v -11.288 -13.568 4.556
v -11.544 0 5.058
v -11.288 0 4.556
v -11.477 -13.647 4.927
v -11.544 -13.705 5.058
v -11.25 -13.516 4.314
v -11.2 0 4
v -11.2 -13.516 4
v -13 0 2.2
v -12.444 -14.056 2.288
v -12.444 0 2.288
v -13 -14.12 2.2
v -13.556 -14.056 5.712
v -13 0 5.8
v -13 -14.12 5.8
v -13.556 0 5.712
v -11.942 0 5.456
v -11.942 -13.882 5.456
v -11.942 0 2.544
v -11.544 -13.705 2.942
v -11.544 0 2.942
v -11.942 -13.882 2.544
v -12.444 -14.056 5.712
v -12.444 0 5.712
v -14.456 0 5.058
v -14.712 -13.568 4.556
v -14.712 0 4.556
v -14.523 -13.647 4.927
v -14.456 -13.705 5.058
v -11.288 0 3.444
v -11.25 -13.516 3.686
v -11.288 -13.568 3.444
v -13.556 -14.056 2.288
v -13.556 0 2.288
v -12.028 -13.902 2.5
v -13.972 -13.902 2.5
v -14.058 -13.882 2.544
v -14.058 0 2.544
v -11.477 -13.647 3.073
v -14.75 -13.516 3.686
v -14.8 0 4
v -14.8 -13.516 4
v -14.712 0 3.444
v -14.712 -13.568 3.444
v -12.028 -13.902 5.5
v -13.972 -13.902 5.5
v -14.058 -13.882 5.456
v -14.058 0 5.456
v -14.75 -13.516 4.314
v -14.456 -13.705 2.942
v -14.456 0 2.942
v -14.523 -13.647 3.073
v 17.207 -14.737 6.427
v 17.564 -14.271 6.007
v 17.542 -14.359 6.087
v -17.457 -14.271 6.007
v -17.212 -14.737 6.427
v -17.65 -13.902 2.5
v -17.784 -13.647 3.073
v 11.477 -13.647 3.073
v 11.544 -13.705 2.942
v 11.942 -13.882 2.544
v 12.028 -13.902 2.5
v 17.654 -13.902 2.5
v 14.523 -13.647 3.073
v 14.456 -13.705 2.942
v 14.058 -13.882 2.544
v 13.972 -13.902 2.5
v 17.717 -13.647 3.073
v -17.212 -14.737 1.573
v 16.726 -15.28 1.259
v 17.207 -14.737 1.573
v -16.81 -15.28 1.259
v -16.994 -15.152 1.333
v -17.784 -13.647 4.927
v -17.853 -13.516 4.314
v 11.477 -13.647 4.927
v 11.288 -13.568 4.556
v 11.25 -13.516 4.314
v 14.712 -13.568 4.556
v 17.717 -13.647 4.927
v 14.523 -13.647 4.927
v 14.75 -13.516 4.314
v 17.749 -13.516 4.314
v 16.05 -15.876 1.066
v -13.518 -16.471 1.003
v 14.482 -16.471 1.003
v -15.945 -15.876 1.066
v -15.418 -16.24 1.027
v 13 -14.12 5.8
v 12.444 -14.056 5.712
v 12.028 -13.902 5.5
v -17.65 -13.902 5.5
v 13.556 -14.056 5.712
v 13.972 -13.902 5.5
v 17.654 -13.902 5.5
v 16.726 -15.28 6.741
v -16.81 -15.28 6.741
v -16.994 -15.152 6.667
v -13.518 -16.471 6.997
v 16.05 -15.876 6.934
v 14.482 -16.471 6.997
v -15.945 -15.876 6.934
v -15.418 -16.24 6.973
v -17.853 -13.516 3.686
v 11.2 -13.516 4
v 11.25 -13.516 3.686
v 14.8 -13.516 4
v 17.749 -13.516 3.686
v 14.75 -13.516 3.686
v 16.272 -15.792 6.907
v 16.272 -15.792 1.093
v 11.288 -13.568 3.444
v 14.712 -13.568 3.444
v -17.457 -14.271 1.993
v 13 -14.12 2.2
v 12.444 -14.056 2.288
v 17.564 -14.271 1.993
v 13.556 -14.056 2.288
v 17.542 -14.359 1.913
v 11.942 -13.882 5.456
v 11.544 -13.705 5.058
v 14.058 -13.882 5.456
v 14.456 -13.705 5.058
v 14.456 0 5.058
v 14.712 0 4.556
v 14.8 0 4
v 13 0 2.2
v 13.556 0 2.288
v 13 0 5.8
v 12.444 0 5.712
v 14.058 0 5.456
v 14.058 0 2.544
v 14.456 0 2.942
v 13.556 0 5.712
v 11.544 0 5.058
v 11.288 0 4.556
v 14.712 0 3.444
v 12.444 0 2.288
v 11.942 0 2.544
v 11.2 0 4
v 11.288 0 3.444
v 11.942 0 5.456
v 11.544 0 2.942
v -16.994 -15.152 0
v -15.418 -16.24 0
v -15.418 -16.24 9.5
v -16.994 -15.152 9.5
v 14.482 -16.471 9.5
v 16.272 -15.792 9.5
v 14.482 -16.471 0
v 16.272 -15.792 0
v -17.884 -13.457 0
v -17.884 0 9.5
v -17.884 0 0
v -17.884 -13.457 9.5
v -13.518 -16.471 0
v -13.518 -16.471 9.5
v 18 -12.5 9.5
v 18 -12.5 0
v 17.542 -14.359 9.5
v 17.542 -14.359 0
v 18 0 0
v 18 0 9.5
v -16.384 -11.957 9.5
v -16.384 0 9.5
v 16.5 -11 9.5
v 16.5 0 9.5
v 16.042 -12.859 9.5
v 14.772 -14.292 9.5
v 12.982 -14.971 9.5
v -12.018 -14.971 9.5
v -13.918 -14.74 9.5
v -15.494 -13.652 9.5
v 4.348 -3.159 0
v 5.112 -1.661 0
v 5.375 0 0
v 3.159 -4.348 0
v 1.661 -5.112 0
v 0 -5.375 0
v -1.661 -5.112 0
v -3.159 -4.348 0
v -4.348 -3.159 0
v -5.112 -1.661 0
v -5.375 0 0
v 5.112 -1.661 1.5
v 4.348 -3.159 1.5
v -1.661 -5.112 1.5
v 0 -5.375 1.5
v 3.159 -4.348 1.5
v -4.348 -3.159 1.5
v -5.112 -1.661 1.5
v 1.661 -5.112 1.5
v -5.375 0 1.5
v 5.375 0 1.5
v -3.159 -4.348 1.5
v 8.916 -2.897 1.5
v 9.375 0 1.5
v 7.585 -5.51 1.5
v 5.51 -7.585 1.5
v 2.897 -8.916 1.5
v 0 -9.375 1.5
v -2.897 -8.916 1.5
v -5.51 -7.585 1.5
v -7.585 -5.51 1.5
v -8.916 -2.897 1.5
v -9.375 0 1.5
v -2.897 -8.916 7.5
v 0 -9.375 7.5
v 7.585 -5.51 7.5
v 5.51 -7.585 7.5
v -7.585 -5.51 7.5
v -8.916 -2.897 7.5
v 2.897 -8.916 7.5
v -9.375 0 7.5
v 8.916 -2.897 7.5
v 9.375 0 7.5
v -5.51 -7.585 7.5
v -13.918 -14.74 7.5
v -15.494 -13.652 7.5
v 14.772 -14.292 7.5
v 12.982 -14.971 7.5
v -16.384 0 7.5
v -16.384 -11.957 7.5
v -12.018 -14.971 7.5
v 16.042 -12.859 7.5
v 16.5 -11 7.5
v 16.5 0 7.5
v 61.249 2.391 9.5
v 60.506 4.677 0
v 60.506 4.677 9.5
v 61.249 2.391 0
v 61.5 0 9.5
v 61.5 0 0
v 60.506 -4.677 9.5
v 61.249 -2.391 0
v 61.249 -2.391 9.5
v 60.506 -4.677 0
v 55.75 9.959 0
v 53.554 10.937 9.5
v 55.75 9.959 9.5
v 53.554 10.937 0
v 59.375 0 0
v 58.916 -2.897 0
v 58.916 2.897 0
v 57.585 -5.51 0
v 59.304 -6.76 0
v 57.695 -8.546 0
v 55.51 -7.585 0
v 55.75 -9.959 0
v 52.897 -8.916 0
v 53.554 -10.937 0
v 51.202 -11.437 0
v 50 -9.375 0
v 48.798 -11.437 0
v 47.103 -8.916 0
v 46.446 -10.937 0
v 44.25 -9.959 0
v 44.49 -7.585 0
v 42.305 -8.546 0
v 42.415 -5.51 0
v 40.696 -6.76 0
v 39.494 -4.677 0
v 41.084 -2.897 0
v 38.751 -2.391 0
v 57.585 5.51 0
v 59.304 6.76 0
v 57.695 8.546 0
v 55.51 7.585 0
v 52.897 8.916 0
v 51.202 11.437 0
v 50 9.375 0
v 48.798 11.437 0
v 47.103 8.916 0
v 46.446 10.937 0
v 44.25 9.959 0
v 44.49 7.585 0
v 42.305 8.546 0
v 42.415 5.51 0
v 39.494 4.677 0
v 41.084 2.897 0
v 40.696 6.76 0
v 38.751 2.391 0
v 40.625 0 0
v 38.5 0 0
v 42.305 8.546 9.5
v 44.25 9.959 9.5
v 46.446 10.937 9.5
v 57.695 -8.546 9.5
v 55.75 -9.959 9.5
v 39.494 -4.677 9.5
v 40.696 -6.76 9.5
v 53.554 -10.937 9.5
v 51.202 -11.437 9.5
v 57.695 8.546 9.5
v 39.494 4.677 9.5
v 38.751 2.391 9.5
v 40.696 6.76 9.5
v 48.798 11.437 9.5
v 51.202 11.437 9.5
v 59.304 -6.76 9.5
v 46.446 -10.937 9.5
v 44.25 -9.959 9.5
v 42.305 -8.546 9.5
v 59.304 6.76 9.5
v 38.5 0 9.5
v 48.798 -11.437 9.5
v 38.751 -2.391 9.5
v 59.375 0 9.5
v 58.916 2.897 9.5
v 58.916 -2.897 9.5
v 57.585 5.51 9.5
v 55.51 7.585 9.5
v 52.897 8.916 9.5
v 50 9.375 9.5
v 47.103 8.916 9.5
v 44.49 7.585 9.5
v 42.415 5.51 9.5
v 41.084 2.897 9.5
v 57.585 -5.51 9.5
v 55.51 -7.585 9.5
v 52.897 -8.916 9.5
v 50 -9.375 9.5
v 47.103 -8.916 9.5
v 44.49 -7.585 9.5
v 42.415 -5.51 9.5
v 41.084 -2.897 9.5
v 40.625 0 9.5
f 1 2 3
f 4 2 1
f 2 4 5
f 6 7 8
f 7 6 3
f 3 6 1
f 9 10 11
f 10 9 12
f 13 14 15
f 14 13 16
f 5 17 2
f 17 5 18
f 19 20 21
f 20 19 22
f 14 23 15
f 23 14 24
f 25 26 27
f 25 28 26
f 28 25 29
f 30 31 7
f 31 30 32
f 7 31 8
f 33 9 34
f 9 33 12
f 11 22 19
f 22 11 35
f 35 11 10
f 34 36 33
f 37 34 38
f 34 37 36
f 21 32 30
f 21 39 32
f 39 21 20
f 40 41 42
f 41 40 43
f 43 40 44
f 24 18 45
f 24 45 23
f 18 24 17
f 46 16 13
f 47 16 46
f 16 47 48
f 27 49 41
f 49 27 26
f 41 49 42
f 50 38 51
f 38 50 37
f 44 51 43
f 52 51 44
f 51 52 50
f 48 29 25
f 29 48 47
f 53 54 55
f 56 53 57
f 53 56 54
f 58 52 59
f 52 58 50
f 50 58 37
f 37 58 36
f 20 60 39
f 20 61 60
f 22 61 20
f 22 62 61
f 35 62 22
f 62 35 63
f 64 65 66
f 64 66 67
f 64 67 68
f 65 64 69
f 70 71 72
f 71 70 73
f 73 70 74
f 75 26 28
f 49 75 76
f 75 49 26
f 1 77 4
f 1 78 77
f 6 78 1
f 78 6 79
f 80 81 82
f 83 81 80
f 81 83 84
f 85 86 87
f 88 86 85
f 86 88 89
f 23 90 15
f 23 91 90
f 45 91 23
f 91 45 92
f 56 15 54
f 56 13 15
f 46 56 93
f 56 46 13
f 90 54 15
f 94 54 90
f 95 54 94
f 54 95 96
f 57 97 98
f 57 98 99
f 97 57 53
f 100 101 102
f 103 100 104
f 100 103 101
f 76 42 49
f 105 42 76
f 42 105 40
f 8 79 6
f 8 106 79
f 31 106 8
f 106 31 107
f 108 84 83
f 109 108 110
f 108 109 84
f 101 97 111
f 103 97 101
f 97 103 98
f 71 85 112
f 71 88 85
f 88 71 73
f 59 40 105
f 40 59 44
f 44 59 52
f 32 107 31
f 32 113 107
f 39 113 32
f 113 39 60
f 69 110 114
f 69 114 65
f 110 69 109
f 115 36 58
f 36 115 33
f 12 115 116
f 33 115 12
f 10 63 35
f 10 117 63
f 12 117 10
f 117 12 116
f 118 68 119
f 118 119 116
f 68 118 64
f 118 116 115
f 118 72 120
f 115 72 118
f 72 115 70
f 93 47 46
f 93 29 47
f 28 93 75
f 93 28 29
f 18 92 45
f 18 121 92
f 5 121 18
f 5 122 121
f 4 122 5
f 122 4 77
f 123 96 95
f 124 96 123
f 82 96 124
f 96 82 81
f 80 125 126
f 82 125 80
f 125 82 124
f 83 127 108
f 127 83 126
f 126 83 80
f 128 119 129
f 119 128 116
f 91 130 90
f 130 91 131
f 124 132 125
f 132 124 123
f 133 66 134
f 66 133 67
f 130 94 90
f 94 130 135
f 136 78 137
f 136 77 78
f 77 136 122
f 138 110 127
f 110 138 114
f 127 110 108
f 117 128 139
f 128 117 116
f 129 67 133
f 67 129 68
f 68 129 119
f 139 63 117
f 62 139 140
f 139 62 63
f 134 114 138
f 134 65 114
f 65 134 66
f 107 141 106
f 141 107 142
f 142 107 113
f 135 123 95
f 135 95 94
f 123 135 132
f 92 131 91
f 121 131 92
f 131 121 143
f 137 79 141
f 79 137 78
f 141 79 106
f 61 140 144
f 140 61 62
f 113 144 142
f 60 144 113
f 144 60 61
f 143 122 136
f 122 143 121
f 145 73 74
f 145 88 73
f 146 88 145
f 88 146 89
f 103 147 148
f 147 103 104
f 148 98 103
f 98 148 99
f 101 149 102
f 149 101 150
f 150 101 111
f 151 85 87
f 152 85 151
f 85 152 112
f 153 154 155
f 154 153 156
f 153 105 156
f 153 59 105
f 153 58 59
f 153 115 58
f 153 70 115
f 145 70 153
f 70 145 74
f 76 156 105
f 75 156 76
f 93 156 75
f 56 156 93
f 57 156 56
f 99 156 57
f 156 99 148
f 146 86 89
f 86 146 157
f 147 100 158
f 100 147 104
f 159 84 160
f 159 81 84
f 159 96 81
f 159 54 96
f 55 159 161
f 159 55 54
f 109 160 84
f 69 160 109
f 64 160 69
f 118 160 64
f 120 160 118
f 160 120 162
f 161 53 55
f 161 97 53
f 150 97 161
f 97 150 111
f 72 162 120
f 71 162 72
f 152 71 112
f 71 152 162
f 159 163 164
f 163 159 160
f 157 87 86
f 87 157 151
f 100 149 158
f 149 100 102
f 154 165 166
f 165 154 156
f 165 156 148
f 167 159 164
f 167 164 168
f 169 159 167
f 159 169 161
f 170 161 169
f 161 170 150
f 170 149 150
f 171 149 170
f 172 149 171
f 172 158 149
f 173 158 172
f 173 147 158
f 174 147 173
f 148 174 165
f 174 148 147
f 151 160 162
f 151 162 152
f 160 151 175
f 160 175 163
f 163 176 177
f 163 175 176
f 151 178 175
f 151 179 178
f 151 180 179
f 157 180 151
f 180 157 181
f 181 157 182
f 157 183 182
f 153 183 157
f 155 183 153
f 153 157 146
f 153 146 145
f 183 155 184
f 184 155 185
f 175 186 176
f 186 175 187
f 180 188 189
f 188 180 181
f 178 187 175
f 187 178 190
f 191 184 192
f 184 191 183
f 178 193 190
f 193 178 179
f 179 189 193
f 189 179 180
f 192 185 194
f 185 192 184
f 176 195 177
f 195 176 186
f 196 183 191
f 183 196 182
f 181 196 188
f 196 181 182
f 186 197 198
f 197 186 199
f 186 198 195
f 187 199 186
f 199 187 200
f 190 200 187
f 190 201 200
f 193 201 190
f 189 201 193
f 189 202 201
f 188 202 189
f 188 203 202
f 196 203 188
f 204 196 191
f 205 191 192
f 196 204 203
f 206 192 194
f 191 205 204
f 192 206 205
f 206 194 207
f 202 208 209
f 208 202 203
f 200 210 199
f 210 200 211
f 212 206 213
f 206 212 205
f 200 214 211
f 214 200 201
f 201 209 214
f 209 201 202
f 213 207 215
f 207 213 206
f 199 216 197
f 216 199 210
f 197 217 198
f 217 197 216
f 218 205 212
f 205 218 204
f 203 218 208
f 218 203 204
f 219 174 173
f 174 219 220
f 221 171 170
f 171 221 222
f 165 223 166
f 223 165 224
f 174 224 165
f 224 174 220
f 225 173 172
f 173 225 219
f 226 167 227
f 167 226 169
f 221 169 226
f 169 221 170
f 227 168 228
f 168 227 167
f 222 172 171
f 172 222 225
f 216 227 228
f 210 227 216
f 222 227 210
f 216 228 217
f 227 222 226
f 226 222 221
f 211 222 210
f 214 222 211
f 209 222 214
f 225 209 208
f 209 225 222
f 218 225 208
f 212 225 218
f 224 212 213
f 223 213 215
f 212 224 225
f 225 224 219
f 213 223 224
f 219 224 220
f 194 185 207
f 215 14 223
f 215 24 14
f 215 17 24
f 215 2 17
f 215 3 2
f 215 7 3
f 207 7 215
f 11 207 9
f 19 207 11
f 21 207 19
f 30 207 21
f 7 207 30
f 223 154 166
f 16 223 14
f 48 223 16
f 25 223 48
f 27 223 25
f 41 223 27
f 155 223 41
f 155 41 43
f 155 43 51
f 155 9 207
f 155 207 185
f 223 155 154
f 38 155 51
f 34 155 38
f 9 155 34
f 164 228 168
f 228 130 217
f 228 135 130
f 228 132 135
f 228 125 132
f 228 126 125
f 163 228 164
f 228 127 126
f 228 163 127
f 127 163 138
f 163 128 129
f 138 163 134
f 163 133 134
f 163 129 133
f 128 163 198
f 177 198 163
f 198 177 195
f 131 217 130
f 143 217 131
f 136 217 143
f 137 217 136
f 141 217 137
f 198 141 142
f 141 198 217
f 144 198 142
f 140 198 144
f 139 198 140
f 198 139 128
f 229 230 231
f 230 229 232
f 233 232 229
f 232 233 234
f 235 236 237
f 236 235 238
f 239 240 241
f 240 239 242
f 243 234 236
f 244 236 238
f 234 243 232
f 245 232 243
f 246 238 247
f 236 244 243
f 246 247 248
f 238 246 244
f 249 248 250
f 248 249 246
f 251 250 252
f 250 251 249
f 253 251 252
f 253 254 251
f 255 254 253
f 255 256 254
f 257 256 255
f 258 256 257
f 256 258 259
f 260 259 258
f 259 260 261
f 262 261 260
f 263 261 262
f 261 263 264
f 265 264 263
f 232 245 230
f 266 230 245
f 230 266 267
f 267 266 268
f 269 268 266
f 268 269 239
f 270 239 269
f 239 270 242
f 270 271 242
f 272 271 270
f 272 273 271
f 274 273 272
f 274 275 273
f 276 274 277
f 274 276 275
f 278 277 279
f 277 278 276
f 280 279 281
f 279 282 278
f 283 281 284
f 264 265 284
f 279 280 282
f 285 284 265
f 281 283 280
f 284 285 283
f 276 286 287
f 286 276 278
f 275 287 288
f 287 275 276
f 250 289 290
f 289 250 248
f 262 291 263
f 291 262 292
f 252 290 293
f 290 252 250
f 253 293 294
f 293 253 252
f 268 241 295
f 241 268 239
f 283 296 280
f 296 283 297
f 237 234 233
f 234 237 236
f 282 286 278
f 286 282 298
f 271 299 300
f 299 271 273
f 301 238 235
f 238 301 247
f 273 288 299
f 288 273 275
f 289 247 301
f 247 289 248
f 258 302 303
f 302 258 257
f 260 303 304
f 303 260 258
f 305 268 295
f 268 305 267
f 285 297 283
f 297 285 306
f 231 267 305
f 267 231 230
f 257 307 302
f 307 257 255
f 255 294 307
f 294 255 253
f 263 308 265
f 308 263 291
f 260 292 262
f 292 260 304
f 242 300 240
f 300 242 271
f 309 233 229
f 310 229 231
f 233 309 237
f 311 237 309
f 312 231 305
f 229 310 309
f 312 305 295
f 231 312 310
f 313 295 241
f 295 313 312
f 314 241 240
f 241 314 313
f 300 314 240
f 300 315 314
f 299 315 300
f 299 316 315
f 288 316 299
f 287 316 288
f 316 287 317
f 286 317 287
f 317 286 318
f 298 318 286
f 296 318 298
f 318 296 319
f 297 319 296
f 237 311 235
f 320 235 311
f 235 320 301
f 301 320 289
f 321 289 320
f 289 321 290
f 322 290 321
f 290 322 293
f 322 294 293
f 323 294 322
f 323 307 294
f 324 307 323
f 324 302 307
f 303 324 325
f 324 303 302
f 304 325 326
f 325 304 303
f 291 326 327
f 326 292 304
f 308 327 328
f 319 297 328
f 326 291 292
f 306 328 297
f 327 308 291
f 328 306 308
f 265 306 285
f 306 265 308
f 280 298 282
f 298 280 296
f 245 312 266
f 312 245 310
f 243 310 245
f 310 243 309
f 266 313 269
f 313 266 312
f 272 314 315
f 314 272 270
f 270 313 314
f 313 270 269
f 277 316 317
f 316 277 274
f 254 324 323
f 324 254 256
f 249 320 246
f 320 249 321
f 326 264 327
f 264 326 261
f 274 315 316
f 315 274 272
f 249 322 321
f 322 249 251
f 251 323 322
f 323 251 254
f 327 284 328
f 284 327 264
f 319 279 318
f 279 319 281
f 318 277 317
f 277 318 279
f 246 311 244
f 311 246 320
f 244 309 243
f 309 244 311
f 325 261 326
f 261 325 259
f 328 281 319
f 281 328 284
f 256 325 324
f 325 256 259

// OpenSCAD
// file: dronePlates.scad
/**
 * dronePlates.scad
 * Plate library
 *
 * GNU GPL V3
 * @author: Victor Potenciano
 */

m3Rad = 3.4/2;
cornerR = 4;

/**
 *
 */
module helperDisk(diameter) {
	cylinder(r = diameter/2, h = 0.6, $fn=20);
}

/**
 *
 */
module roundedRect(size, radius) {
	x = size[0];
	y = size[1];
	z = size[2];

	linear_extrude(height=z)
	hull() {
	// place 4 circles in the corners, with the given radius
	translate([(-x/2)+(radius/2), (-y/2)+(radius/2), 0]){ circle(r=radius); }
	translate([(x/2)-(radius/2), (-y/2)+(radius/2), 0]){ circle(r=radius); }
	translate([(-x/2)+(radius/2), (y/2)-(radius/2), 0]){ circle(r=radius); }
	translate([(x/2)-(radius/2), (y/2)-(radius/2), 0]){ circle(r=radius); }
	}
}

/**
 * rounded rectangle triangle with corner at origin
 */
module roundedTriangle(size, radius) {
	x = size[0];
	y = size[1];
	z = size[2];

	linear_extrude(height=z)
	hull() {
	translate([radius, radius, 0]){ circle(r=radius); }
	translate([x-radius, radius, 0]){ circle(r=radius); }
	translate([radius, y-radius, 0]){ circle(r=radius); }
	}
}

/**
 *
 */
module roundRectPlate(w, l, plateThick=3) {
	difference(){
		roundedRect([l+m3Rad*1.75,w+m3Rad*1.75,plateThick], cornerR);
		translate([l/2, w/2, -0.5]) { cylinder(h = plateThick+1, r = m3Rad, $fn=30); }
		translate([-l/2, w/2, -0.5]) { cylinder(h = plateThick+1, r = m3Rad, $fn=30); }
		translate([l/2, -w/2, -0.5]) { cylinder(h = plateThick+1, r = m3Rad, $fn=30); }
		translate([-l/2, -w/2, -0.5]) { cylinder(h = plateThick+1, r = m3Rad, $fn=30); }
	}
}

/**
 *
 */
module crossSquarePlate(l, thick=3) {
	inDist = cornerR*2+4;
	trianL = sqrt((l*l)/2)-inDist;
	centerR = 4;

	difference(){
		roundRectPlate(l, l, thick);
		translate([0, centerR, -0.5]) { 
			rotate([0,0,45]){ roundedTriangle([trianL,trianL,thick+1], cornerR-2); }
		}
		translate([0, -centerR, -0.5]) { 
			rotate([0,0,225]){ roundedTriangle([trianL,trianL,thick+1], cornerR-2); }
		}
		translate([-centerR, 0, -0.5]) { 
			rotate([0,0,135]){ roundedTriangle([trianL,trianL,thick+1], cornerR-2); }
		}
		translate([centerR, 0, -0.5]) { 
			rotate([0,0,-45]){ roundedTriangle([trianL,trianL,thick+1], cornerR-2); }
		}
	}
}

/**
 *
 */
module hShapePlate(w, l, thick=4) {
	inDist = cornerR*2+1;

	difference(){
		roundRectPlate(w, l, thick);
		translate([0, w/4, -0.5]) { roundedRect([l-inDist,w/2-inDist,thick+1], cornerR-2); }
		translate([0, -w/4, -0.5]) { roundedRect([l-inDist,w/2-inDist,thick+1], cornerR-2); }
	}
}

/**
 *
 */
module motorCircleMount(inDia, outDia, thick=3, extraH=false, d1=19, d2=16, holeR=m3Rad ) {
	difference(){
		cylinder(h = thick, r = outDia/2, $fn=30);
		motorCircleMountHoles(inDia, outDia, thick, extraH, d1=d1, d2=d2, holeR=holeR);
	}
}

/**
 *
 */
module motorCircleMountHoles(inDia, outDia, thick=3, extraH=false, d1=19, d2=16, d3=25, holeR=m3Rad) {
	translate([0, 0, -0.5]) { cylinder(h = thick+1, r = inDia/2, $fn=30); }

	for(i=[0:3]) {
		rotate([0,0,90*i]){
		translate([d1/2, 0, -0.5]) cylinder(h = thick+1, r = holeR, $fn=20);
		translate([d2/2, 0, -0.5]) cylinder(h = thick+1, r = holeR, $fn=20);
		translate([d2/2, -holeR, -0.5]) cube(size = [(d1-d2)/2,holeR*2,thick+1]);
		}
	}
	
	if(extraH==true){	
		for(i=[-1,1]) translate([i*d3/2, 0, -0.5]) { cylinder(h = thick+1, r = holeR, $fn=30); }
	}
}

/**
 *
 */
module motorRectMount(w, l, inDia, thick=3) {
	d1=19;
	d2=16;

	difference(){
		roundRectPlate(w, l, thick);
		translate([0, 0, -0.5]) { cylinder(h = thick+1, r = inDia/2, $fn=30); }
		translate([0, d1/2, -0.5]) { cylinder(h = thick+1, r = m3Rad, $fn=30); }
		translate([0, -d1/2, -0.5]) { cylinder(h = thick+1, r = m3Rad, $fn=30); }
		translate([d2/2, 0, -0.5]) { cylinder(h = thick+1, r = m3Rad, $fn=30); }
		translate([-d2/2, 0, -0.5]) { cylinder(h = thick+1, r = m3Rad, $fn=30); }
	}
}

/**
 *
 */
module tube(inDia, outDia, height) {
	difference(){
		cylinder(h = height, r = outDia/2, $fn=50);
		translate([0, 0, -0.5]) { cylinder(h = height+1, r = inDia/2, $fn=30); }
	}
}

/**
 *
 */
module squareTube(inDia, outDia, height) {
	translate([0,0,height/2]){
	difference(){
		cube(size = [outDia,outDia,height], center = true);
		cube(size = [inDia,inDia,height+1], center = true);
	}
	}
}

/**
 *
 */
module djiFlamewheelHoles(height) {
	a = 23;
	b = 16;
	c = 19.5;
	
	translate([a/2, c/2, 0]) { cylinder(h = height, r = m3Rad, $fn=30); }
	translate([-a/2, c/2, 0]) { cylinder(h = height, r = m3Rad, $fn=30); }
	translate([b/2, -c/2, 0]) { cylinder(h = height, r = m3Rad, $fn=30); }
	translate([-b/2, -c/2, 0]) { cylinder(h = height, r = m3Rad, $fn=30); }
}

/**
 *
 */
module djiFlamewheelHolesBotton(height) {
	a1 = 21;
	c = 19.5;
	
	translate([a1/2, c/2, 0]) { cylinder(h = height, r = m3Rad, $fn=30); }
	translate([-a1/2, c/2, 0]) { cylinder(h = height, r = m3Rad, $fn=30); }
}

/**
 *
 */
module propeller(size){
union(){
difference(){
	cylinder(h = 3, r = size/2, center=true, $fn=30);
	cylinder(h = 3.1, r = size/2-2, center=true, $fn=30); 
}
for( i = [-1,1] ){
rotate([0,0,45*i]){ cube(size = [size,4,1], center = true); }
}
}
}

/**
 *
 */
module slot(length, height, rad){
for(i=[-1,1]) translate([i*length/2,0,0]) cylinder(h = height, r = rad, $fn=30);
translate([0,0,height/2]) cube(size = [length,rad*2,height], center = true);
}

 

////////////////////////
// Examples:
////////////////////////

motorCircleMount(8, 25, 3.5);

//roundedRect([50,50,3], 4);

//hShapePlate(79, 25);

//rotate([0,0,45]){roundedTriangle([40,40,3], 4);}

//crossSquarePlate(45, 4);

/*
union(){
motorRectMount(21, 18, 8, 4);
translate([9, 10.5, 0]) {tube(m3Rad*2, 6.5, 6);}
}
*/

/*
difference(){
union(){
hShapePlate(50, 30, 3.5);
translate([-4,-25,0]){cube(size = [8,50,3.5]);}
rotate([0, 0, 45]) {motorCircleMount(8, 35, 3.5);}
}
cylinder(h = 10, r = 4, $fn=100, center=true);
}
*/

//rotate([90,0,0]){ tube(5,10,20); }
//translate([20,0,0]){ squareTube(5, 10, 20); }
// main file
/**
 * Mobius adapter for gopro filter adapter
 *
 */

use <dronePlates.scad>


m3Rad = 3.6/2;
goProW = 36;
goProH = 33;
mobiusOD = 18.75;// + 0.75mm 
mobiusID = 10.75;// + 0.75mm
inH = 1.5;
outH = 8;
cornerR = 4;
totalH = inH+outH;

/**
 *
 */
module adapter(){

difference(){
union(){
////translate([0,0,totalH/2]) cube(size=[goProW,goProH,totalH],center=true);
translate([0,0,0]) roundedRect([goProW-cornerR,goProH-cornerR,totalH], cornerR);
}

translate([0,0,-1]) cylinder(r=mobiusID/2,h=20,$fn=20);

translate([0,0,inH]) cylinder(r=mobiusOD/2,h=outH+1,$fn=20);

for(i=[-1,1]){ 
translate([i*(goProW/2-5),0,4]) rotate([90,0,0]) cylinder(r=m3Rad,h=goProH+1,$fn=20,center=true);
translate([0,i*(goProH/2),4]) rotate([0,90,0]) cylinder(h=goProW,r=3,$fn=30,center=true);
}

translate([0,0,totalH-2]) roundedRect([goProW-cornerR-3,goProH-cornerR-3,totalH], cornerR);

}//diff

}//end module

/**
 * simple ring for polar-pro 23mm
 */
module adapter2(){

difference(){
union(){
cylinder(r=23/2,h=totalH,$fn=30);
}
translate([0,0,-1]) cylinder(r=mobiusOD/2,h=20,$fn=20);
}//diff

}//end module


difference(){
adapter();
translate([-50,0,-1]) cube(size=100,100,20);
}


translate([50,0,0]) adapter2();
